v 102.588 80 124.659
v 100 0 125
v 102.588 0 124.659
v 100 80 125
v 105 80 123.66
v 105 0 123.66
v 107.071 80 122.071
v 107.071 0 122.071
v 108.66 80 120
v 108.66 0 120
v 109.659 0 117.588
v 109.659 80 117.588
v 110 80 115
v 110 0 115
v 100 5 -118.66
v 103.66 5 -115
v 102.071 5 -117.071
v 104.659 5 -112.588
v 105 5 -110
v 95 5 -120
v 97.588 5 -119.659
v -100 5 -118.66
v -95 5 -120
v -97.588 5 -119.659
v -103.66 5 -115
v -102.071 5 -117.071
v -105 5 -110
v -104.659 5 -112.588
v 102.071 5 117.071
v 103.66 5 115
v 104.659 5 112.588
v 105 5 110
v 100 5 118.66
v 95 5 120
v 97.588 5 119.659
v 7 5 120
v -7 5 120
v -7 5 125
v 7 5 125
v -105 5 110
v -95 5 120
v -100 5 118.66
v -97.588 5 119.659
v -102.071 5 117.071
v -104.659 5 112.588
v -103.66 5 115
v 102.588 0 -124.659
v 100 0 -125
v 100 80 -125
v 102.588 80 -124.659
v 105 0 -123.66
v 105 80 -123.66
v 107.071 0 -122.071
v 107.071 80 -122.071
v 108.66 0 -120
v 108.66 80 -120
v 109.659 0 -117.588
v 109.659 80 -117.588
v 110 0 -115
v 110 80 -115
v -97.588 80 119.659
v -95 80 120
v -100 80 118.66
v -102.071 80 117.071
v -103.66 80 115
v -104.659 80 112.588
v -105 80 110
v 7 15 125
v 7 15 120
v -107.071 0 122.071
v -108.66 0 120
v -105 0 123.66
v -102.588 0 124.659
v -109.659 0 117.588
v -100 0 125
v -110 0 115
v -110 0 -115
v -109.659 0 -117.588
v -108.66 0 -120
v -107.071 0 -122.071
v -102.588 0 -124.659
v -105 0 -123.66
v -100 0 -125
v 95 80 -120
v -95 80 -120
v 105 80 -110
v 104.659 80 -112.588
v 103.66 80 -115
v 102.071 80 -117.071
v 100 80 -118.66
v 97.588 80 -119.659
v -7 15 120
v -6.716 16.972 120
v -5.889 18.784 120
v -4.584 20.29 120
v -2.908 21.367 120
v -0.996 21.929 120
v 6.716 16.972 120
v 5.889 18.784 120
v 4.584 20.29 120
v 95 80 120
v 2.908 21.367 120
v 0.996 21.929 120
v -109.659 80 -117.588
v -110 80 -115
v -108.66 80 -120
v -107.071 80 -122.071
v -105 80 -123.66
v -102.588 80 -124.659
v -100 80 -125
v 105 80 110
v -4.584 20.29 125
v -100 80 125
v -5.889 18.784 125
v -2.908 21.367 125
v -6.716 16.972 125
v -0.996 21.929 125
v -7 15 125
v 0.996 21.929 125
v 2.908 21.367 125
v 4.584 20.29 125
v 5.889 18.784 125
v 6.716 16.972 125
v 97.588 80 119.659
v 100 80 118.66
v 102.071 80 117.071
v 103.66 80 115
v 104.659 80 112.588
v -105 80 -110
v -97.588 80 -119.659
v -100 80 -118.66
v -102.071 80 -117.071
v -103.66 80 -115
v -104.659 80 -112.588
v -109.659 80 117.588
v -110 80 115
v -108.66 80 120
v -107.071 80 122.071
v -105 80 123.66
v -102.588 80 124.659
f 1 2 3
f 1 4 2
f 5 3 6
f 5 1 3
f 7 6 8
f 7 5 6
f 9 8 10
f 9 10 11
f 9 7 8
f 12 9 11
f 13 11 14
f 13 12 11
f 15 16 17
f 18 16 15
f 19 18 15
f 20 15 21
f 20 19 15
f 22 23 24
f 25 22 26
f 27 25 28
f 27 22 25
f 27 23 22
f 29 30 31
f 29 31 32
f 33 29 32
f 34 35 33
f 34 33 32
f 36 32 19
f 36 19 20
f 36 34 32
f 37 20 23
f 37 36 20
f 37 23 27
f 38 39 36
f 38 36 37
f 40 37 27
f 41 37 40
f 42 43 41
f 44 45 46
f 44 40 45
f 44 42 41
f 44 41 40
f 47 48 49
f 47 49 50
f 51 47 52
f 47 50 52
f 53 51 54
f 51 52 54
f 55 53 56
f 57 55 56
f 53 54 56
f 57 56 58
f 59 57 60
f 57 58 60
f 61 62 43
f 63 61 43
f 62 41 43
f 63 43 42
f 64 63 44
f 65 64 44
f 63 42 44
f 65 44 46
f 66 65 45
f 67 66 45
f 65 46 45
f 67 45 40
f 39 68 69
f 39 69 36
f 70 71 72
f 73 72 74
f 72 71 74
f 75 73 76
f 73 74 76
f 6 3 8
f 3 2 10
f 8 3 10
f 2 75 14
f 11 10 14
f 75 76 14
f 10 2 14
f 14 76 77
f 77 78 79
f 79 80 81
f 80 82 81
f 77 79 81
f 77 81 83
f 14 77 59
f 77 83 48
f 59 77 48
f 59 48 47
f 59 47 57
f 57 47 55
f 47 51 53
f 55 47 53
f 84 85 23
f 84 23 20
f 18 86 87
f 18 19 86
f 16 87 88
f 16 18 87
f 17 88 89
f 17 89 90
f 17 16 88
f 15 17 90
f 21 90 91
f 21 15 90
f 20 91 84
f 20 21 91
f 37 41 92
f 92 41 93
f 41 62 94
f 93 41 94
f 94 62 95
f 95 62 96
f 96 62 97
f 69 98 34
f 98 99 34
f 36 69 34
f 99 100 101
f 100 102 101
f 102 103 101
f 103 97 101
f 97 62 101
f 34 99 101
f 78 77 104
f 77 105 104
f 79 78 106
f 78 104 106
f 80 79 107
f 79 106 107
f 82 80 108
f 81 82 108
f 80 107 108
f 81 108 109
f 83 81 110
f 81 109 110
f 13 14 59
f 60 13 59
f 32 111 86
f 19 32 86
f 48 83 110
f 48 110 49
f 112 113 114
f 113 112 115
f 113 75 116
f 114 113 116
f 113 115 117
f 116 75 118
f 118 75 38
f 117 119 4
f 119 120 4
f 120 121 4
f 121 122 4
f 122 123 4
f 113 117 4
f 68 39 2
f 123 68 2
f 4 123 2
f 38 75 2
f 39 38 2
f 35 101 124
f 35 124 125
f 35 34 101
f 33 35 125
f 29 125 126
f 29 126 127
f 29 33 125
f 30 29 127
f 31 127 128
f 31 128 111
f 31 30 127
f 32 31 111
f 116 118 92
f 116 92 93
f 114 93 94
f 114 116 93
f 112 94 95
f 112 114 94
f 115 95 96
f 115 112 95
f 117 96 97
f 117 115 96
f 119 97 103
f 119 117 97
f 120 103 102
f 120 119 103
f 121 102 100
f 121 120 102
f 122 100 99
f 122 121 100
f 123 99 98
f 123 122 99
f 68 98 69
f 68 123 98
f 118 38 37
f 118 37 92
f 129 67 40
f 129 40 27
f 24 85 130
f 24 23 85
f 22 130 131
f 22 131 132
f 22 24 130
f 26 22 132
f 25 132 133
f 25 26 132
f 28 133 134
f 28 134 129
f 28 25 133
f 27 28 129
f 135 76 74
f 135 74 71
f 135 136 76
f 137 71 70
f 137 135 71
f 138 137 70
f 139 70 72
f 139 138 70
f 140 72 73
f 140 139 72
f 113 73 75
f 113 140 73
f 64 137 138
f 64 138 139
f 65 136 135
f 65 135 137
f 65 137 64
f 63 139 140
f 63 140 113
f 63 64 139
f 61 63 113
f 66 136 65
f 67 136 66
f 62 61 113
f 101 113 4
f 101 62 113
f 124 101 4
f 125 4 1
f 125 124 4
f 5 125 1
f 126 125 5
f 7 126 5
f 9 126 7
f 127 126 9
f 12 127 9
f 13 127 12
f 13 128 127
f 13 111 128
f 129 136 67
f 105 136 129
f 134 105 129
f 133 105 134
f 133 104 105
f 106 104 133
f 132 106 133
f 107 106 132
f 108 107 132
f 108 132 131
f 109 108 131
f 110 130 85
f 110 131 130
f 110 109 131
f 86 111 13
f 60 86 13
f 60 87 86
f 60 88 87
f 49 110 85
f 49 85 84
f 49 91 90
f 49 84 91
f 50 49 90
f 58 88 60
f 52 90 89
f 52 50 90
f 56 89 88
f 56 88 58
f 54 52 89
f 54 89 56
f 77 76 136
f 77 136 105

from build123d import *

# Parameters (mm, degrees)
SKETCH2_W           = 220
SKETCH2_H           = 250
BOSS_EXTRUDE2_DEPTH = 80
SKETCH3_W           = 210
SKETCH3_H           = 240
CUT_EXTRUDE1_DEPTH  = 75
FILLET1_R           = 10
CUT_EXTRUDE2_DEPTH  = 75


with BuildPart() as part:
    # Sketch2 → Boss-Extrude2 (new body)
    with BuildSketch(Plane(origin=(0, 0, 0), x_dir=(1, 0, 0), z_dir=(0, 1, 0))):
        Rectangle(SKETCH2_W, SKETCH2_H)
    extrude(amount=BOSS_EXTRUDE2_DEPTH)

    # Sketch3 → Cut-Extrude1 (cut)
    with BuildSketch(Plane(origin=(0, 80, 0), x_dir=(1, 0, 0), z_dir=(0, 1, 0))):
        Rectangle(SKETCH3_W, SKETCH3_H)
    extrude(amount=-CUT_EXTRUDE1_DEPTH, mode=Mode.SUBTRACT)

    # Fillet1
    fillet1_edges = [part.edges().sort_by_distance(p)[0] for p in [
        (-105, 42.5, 120),
        (-105, 42.5, -120),
        (105, 42.5, -120),
        (105, 42.5, 120),
        (-110, 40, -125),
        (110, 40, -125),
        (110, 40, 125),
        (-110, 40, 125),
    ]]
    fillet(fillet1_edges, radius=FILLET1_R)

    # Sketch4 → Cut-Extrude2 (cut)
    with BuildSketch(Plane.XY.offset(125)):
        with BuildLine():
            Line((-7, 5), (-7, 15))
            ThreePointArc((-7, 15), (0, 22), (7, 15))
            Line((7, 15), (7, 5))
            Line((7, 5), (-7, 5))
        make_face()
    extrude(amount=-CUT_EXTRUDE2_DEPTH, mode=Mode.SUBTRACT)


solid = part.part
